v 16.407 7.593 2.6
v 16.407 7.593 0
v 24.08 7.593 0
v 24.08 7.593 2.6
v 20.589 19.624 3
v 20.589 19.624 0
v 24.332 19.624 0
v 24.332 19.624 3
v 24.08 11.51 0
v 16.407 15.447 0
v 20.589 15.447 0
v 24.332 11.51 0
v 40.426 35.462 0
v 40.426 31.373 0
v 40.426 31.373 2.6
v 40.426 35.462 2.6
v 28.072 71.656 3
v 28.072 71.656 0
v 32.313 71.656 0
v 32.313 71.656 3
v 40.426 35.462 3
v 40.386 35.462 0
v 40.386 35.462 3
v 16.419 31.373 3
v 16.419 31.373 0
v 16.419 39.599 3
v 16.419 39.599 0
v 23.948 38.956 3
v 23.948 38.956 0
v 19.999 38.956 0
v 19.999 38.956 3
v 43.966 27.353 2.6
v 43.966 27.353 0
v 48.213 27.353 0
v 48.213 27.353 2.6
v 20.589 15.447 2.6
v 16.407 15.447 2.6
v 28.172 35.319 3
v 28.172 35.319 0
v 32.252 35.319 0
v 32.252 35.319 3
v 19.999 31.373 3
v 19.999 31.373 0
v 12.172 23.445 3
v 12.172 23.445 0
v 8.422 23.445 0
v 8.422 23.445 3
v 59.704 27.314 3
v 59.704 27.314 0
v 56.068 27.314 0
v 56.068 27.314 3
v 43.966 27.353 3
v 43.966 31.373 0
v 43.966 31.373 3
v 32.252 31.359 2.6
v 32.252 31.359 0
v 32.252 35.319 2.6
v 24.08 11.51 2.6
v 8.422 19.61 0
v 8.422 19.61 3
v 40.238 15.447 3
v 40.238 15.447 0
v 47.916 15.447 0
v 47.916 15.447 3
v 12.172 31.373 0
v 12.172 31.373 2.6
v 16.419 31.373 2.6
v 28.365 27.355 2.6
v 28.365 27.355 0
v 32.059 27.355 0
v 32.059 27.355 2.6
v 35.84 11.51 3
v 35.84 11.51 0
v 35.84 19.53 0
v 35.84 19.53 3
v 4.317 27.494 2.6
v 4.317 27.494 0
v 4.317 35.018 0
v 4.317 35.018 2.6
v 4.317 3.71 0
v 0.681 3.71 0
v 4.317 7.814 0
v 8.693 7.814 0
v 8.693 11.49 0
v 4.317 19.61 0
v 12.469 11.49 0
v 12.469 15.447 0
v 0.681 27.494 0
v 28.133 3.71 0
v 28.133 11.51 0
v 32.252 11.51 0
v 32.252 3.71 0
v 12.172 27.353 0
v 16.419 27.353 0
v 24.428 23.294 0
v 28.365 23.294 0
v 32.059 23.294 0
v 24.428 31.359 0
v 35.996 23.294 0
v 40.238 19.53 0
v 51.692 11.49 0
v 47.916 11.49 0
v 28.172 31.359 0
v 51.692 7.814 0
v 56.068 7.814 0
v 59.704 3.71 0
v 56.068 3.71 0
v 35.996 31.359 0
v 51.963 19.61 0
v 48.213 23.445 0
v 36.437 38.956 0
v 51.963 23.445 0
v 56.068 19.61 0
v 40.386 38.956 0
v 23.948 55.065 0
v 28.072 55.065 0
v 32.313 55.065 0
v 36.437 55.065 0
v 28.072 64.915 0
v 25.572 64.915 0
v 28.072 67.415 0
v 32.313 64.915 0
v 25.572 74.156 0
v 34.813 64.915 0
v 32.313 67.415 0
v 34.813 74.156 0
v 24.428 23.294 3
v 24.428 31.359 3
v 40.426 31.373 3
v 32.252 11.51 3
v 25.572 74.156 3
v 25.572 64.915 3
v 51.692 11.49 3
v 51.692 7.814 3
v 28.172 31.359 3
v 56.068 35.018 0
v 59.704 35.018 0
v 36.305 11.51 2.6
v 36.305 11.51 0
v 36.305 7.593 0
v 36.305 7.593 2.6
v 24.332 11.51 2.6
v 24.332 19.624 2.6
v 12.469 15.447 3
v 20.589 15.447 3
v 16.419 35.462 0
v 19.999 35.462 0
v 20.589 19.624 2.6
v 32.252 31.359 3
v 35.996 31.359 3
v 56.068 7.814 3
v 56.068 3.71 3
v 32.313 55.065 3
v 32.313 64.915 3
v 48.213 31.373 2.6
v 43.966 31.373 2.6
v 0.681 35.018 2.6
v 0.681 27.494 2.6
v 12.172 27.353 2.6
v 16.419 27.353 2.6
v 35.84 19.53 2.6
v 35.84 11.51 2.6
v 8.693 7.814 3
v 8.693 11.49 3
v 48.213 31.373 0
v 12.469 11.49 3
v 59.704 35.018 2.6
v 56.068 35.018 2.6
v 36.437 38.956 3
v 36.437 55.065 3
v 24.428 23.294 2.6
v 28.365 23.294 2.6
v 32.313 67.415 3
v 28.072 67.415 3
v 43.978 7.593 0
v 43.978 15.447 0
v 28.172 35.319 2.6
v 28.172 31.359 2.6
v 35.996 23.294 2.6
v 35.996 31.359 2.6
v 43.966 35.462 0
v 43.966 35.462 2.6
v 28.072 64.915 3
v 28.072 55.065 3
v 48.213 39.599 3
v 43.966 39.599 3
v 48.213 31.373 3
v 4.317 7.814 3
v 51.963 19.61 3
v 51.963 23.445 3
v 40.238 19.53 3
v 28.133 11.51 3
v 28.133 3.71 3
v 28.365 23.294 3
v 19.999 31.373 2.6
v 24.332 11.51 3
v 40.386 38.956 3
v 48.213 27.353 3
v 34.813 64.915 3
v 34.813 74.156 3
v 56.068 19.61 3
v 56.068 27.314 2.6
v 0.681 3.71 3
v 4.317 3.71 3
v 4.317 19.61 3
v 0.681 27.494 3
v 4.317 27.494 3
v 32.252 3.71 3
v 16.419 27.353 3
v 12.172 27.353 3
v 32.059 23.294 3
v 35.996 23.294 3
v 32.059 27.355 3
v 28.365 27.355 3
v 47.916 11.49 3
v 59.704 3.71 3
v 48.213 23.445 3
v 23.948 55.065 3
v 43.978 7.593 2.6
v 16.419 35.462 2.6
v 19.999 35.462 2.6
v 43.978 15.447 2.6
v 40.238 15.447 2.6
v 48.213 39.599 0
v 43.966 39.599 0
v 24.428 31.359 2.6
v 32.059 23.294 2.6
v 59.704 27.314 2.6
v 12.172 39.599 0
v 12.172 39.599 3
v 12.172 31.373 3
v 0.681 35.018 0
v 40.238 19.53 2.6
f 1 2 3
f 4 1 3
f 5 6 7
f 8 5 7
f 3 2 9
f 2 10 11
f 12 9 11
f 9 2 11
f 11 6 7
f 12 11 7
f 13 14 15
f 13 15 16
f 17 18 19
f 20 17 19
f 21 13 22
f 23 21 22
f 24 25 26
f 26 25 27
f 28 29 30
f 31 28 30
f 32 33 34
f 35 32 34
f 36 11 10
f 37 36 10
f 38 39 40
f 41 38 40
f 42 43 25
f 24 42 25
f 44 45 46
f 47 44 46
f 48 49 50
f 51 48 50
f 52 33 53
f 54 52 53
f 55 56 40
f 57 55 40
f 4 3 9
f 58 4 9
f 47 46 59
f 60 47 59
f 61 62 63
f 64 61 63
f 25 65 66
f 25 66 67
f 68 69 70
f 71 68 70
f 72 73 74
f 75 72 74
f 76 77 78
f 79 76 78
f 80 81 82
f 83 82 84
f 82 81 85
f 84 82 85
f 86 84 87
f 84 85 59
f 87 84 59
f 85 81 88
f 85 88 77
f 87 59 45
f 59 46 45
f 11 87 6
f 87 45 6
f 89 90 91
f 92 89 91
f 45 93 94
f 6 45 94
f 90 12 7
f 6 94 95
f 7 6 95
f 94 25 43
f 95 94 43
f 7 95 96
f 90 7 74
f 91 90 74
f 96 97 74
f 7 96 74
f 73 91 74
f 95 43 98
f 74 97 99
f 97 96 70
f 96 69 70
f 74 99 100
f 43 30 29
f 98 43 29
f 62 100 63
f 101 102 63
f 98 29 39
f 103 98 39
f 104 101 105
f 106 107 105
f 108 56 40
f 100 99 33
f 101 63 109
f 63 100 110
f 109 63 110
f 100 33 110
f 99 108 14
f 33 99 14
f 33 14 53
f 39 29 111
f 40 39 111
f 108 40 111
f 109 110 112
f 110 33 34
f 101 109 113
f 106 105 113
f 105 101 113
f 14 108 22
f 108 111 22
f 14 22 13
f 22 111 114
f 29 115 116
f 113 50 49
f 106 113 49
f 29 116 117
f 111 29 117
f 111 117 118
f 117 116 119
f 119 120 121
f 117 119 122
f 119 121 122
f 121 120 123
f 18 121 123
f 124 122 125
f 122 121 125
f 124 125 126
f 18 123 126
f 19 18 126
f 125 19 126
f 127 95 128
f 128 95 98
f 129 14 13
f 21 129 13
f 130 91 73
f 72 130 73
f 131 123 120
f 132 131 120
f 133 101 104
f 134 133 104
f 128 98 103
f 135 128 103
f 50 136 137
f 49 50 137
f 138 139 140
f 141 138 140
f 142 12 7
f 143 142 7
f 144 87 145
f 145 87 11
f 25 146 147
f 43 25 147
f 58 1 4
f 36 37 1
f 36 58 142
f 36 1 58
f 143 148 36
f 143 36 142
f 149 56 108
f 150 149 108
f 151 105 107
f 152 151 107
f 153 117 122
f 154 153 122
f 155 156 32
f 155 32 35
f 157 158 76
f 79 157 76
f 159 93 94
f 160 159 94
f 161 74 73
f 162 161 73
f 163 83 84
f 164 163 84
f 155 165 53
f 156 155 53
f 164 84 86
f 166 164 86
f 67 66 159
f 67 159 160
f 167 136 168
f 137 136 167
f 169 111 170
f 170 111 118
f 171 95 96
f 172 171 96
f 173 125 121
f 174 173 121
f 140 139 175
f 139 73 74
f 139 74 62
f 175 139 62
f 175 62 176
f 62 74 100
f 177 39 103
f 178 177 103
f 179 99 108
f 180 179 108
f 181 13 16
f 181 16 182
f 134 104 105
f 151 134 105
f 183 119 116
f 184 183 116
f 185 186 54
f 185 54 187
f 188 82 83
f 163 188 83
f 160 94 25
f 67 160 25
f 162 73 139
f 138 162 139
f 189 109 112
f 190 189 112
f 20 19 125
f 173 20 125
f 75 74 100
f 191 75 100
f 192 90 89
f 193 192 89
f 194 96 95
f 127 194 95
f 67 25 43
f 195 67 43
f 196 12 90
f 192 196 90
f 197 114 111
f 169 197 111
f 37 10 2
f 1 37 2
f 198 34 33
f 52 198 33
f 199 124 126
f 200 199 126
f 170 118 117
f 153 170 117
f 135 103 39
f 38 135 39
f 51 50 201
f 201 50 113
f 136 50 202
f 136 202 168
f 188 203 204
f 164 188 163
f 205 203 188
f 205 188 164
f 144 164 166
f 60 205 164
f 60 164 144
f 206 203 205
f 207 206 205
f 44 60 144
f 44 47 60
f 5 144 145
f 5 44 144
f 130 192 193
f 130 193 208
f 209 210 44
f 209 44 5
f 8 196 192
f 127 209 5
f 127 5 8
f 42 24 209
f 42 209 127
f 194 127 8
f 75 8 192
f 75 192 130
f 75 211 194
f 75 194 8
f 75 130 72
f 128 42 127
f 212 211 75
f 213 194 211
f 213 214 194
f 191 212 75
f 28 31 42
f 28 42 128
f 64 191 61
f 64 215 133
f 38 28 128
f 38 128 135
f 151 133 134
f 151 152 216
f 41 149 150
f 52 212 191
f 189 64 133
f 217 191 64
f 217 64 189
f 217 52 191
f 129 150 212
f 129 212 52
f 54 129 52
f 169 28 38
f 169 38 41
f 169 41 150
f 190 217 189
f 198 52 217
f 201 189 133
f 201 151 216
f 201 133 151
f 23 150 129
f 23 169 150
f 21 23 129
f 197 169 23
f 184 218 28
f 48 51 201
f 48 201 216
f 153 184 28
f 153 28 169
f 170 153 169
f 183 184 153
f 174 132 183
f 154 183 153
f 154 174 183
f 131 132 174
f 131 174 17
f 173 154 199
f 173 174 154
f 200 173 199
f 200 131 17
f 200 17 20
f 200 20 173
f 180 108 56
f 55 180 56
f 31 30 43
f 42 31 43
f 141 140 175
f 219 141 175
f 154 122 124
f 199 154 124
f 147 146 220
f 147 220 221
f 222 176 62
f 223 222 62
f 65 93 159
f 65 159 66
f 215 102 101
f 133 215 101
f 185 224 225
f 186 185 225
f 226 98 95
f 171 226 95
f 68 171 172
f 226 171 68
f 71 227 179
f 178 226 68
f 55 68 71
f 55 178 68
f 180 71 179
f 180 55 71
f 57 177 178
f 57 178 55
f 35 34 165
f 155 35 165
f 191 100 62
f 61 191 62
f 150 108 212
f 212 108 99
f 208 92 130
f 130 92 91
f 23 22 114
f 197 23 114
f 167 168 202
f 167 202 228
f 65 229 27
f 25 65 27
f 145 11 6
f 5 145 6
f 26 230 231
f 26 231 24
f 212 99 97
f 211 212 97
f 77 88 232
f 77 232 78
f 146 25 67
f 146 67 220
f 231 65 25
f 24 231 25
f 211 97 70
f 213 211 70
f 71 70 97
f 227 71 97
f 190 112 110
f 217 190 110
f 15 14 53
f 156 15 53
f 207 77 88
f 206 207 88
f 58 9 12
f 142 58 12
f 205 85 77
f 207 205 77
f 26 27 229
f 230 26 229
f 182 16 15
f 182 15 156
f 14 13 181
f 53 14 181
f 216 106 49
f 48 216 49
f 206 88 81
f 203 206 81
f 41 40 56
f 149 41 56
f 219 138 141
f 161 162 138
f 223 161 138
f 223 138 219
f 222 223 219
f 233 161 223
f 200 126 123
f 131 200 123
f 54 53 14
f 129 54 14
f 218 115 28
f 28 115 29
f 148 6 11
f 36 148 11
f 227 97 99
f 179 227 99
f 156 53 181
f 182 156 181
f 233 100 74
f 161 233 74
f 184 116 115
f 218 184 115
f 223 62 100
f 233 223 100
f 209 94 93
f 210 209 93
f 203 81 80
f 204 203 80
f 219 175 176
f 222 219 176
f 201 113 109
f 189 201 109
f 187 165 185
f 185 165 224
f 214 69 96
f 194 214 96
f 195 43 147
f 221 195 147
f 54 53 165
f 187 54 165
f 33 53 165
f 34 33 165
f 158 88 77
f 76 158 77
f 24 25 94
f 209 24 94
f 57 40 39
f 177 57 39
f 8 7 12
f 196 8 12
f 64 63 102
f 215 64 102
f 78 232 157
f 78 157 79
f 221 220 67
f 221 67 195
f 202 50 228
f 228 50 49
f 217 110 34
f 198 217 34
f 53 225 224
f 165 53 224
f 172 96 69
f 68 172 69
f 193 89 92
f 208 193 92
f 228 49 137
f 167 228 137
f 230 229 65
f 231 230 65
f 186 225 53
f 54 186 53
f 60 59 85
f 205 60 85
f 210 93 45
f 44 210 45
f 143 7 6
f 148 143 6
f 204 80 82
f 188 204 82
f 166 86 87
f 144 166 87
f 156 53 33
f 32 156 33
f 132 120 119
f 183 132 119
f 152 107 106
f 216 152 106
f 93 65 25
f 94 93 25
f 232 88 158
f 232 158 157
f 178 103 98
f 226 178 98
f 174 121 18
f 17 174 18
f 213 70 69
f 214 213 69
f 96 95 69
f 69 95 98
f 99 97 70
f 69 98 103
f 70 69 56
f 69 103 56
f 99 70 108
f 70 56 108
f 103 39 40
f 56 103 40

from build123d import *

# Parameters (mm, degrees)
F1_DEPTH = 3
F0_W     = 3.6364123225
F0_H     = 7.5237620622
F2_DEPTH = 2.6
F0_W_2   = 3.5404209048
F0_H_2   = 4.0894895792
F0_H_3   = 7.7040316537
F0_W_3   = 4.2472146451
F0_H_4   = 4.0195640177
F0_W_4   = 3.5795867443


# Not quite as in the source:
# - a feature names something its author has since deleted; it is built from what else it names


with BuildPart() as f1:
    # F0 (on Top) → F1 (new body)
    with BuildSketch(Plane.XY):
        Polygon((32.3127042502, 67.4153068662), (30.1925335079, 67.4153068662), (28.0723627657, 67.4153068662), (28.0723627657, 64.9153068662), (28.0723627657, 55.0648160279), (23.9476244897, 55.0648160279), (23.9476244897, 38.9564856887), (19.9987087399, 38.9564856887), (19.9987087399, 35.4621224105), (19.9987087399, 31.3726328313), (16.4191219956, 31.3726328313), (16.4191219956, 27.3530688137), (12.1719073504, 27.3530688137), (12.1719073504, 23.4449207783), (8.4218550473, 23.4449207783), (8.4218550473, 19.6096431464), (4.3172221631, 19.6096431464), (4.3172221631, 27.4939443916), (0.6808098406, 27.4939443916), (0.6808098406, 3.7104797084), (4.3172221631, 3.7104797084), (4.3172221631, 7.8136157244), (8.6926203221, 7.8136157244), (8.6926203221, 11.48981601), (12.4692637473, 11.48981601), (12.4692637473, 15.447255224), (16.406616196, 15.447255224), (20.5889474601, 15.447255224), (20.5889474601, 19.6236893535), (24.331657216, 19.6236893535), (24.331657216, 11.5099046379), (28.1328521669, 11.5099046379), (28.1328521669, 3.7104797084), (29.953636229, 3.7104797084), (30.4314307868, 3.7104797084), (32.252214849, 3.7104797084), (32.252214849, 11.5099046379), (35.8404926956, 11.5099046379), (35.8404926956, 19.530121237), (40.2381792665, 19.530121237), (40.2381792665, 15.447255224), (43.9784508198, 15.447255224), (47.9158032686, 15.447255224), (47.9158032686, 11.48981601), (51.6924466938, 11.48981601), (51.6924466938, 7.8136157244), (56.0678448528, 7.8136157244), (56.0678448528, 3.7104797084), (59.7042571753, 3.7104797084), (59.7042571753, 27.3136748001), (56.0678448528, 27.3136748001), (56.0678448528, 19.6096431464), (51.9632119685, 19.6096431464), (51.9632119685, 23.4449207783), (48.2131596655, 23.4449207783), (48.2131596655, 27.3530688137), (44.0051108599, 27.3530688137), (43.9659450203, 27.3530688137), (43.9659450203, 31.3726328313), (40.4255241156, 31.3726328313), (40.4255241156, 35.4621224105), (40.386358276, 35.4621224105), (40.386358276, 38.9564856887), (36.4374425262, 38.9564856887), (36.4374425262, 55.0648160279), (32.3127042502, 55.0648160279), (32.3127042502, 64.9153068662), align=None)
        Polygon((28.1724799424, 31.3594639301), (28.1724799424, 35.3187546134), (32.251752913, 35.3187546134), (32.251752913, 31.3594639301), (35.9961111099, 31.3594639301), (35.9961111099, 23.2938230038), (32.0594422519, 23.2938230038), (32.0594422519, 27.3549240083), (28.3647906035, 27.3549240083), (28.3647906035, 23.2938230038), (24.4281217456, 23.2938230038), (24.4281217456, 31.3594639301), align=None, mode=Mode.SUBTRACT)
        Polygon((32.3127042502, 71.6556483507), (32.3127042502, 67.4153068662), (32.3127042502, 64.9153068662), (34.8127042502, 64.9153068662), (34.8127042502, 74.1556483507), (25.5723627657, 74.1556483507), (25.5723627657, 64.9153068662), (28.0723627657, 64.9153068662), (28.0723627657, 67.4153068662), (28.0723627657, 71.6556483507), align=None)
    extrude(amount=F1_DEPTH)


with BuildPart() as f1b:
    # F0 (on Top) → F1, piece 2 (new body)
    with BuildSketch(Plane.XY):
        Polygon((43.9659450203, 39.5989455283), (43.9659450203, 35.4621224105), (43.9659450203, 31.3726328313), (44.0051108599, 31.3726328313), (48.2131596655, 31.3726328313), (48.2131596655, 39.5989455283), (44.0051108599, 39.5989455283), align=None)
    extrude(amount=F1_DEPTH)


with BuildPart() as f1c:
    # F0 (on Top) → F1, piece 3 (new body)
    with BuildSketch(Plane.XY):
        Polygon((16.4191219956, 31.3726328313), (16.4191219956, 35.4621224105), (16.4191219956, 39.5989455283), (12.1719073504, 39.5989455283), (12.1719073504, 31.3726328313), align=None)
    extrude(amount=F1_DEPTH)


with BuildPart() as f2:
    # F0 (on Top) → F2 (new body)
    with BuildSketch(Plane.XY):
        with Locations((2.4990160018, 31.2558254227)):
            Rectangle(F0_W, F0_H)
    extrude(amount=F2_DEPTH)


with BuildPart() as f2b:
    # F0 (on Top) → F2, piece 2 (new body)
    with BuildSketch(Plane.XY):
        Polygon((32.251752913, 35.3187546134), (28.1724799424, 35.3187546134), (28.1724799424, 31.3594639301), (24.4281217456, 31.3594639301), (24.4281217456, 23.2938230038), (28.3647906035, 23.2938230038), (28.3647906035, 27.3549240083), (32.0594422519, 27.3549240083), (32.0594422519, 23.2938230038), (35.9961111099, 23.2938230038), (35.9961111099, 31.3594639301), (32.251752913, 31.3594639301), align=None)
    extrude(amount=F2_DEPTH)


with BuildPart() as f2c:
    # F0 (on Top) → F2, piece 3 (new body)
    with BuildSketch(Plane.XY):
        with Locations((42.1957345679, 33.4173776209)):
            Rectangle(F0_W_2, F0_H_2)
    extrude(amount=F2_DEPTH)


with BuildPart() as f2d:
    # F0 (on Top) → F2, piece 4 (new body)
    with BuildSketch(Plane.XY):
        with Locations((57.8860510141, 31.1656906269)):
            Rectangle(F0_W, F0_H_3)
    extrude(amount=F2_DEPTH)


with BuildPart() as f2e:
    # F0 (on Top) → F2, piece 5 (new body)
    with BuildSketch(Plane.XY):
        Polygon((43.9784508198, 7.5926417485), (43.9784508198, 15.447255224), (40.2381792665, 15.447255224), (40.2381792665, 19.530121237), (35.8404926956, 19.530121237), (35.8404926956, 11.5099046379), (36.3046396524, 11.5099046379), (36.3046396524, 7.5926417485), align=None)
    extrude(amount=F2_DEPTH)


with BuildPart() as f2f:
    # F0 (on Top) → F2, piece 6 (new body)
    with BuildSketch(Plane.XY):
        Polygon((20.5889474601, 15.447255224), (16.406616196, 15.447255224), (16.406616196, 7.5926417485), (24.0804273635, 7.5926417485), (24.0804273635, 11.5099046379), (24.331657216, 11.5099046379), (24.331657216, 19.6236893535), (20.5889474601, 19.6236893535), align=None)
    extrude(amount=F2_DEPTH)


with BuildPart() as f2g:
    # F0 (on Top) → F2, piece 7 (new body)
    with BuildSketch(Plane.XY):
        with Locations((14.295514673, 29.3628508225)):
            Rectangle(F0_W_3, F0_H_4)
    extrude(amount=F2_DEPTH)


with BuildPart() as f2h:
    # F0 (on Top) → F2, piece 8 (new body)
    with BuildSketch(Plane.XY):
        with Locations((18.2089153677, 33.4173776209)):
            Rectangle(F0_W_4, F0_H_2)
    extrude(amount=F2_DEPTH)


with BuildPart() as f2i:
    # F0 (on Top) → F2, piece 9 (new body)
    with BuildSketch(Plane.XY):
        Polygon((44.0051108599, 31.3726328313), (43.9659450203, 31.3726328313), (43.9659450203, 27.3530688137), (44.0051108599, 27.3530688137), (48.2131596655, 27.3530688137), (48.2131596655, 31.3726328313), align=None)
    extrude(amount=F2_DEPTH)


solid = Compound([f1.part, f1b.part, f1c.part, f2.part, f2b.part, f2c.part, f2d.part, f2e.part, f2f.part, f2g.part, f2h.part, f2i.part])
